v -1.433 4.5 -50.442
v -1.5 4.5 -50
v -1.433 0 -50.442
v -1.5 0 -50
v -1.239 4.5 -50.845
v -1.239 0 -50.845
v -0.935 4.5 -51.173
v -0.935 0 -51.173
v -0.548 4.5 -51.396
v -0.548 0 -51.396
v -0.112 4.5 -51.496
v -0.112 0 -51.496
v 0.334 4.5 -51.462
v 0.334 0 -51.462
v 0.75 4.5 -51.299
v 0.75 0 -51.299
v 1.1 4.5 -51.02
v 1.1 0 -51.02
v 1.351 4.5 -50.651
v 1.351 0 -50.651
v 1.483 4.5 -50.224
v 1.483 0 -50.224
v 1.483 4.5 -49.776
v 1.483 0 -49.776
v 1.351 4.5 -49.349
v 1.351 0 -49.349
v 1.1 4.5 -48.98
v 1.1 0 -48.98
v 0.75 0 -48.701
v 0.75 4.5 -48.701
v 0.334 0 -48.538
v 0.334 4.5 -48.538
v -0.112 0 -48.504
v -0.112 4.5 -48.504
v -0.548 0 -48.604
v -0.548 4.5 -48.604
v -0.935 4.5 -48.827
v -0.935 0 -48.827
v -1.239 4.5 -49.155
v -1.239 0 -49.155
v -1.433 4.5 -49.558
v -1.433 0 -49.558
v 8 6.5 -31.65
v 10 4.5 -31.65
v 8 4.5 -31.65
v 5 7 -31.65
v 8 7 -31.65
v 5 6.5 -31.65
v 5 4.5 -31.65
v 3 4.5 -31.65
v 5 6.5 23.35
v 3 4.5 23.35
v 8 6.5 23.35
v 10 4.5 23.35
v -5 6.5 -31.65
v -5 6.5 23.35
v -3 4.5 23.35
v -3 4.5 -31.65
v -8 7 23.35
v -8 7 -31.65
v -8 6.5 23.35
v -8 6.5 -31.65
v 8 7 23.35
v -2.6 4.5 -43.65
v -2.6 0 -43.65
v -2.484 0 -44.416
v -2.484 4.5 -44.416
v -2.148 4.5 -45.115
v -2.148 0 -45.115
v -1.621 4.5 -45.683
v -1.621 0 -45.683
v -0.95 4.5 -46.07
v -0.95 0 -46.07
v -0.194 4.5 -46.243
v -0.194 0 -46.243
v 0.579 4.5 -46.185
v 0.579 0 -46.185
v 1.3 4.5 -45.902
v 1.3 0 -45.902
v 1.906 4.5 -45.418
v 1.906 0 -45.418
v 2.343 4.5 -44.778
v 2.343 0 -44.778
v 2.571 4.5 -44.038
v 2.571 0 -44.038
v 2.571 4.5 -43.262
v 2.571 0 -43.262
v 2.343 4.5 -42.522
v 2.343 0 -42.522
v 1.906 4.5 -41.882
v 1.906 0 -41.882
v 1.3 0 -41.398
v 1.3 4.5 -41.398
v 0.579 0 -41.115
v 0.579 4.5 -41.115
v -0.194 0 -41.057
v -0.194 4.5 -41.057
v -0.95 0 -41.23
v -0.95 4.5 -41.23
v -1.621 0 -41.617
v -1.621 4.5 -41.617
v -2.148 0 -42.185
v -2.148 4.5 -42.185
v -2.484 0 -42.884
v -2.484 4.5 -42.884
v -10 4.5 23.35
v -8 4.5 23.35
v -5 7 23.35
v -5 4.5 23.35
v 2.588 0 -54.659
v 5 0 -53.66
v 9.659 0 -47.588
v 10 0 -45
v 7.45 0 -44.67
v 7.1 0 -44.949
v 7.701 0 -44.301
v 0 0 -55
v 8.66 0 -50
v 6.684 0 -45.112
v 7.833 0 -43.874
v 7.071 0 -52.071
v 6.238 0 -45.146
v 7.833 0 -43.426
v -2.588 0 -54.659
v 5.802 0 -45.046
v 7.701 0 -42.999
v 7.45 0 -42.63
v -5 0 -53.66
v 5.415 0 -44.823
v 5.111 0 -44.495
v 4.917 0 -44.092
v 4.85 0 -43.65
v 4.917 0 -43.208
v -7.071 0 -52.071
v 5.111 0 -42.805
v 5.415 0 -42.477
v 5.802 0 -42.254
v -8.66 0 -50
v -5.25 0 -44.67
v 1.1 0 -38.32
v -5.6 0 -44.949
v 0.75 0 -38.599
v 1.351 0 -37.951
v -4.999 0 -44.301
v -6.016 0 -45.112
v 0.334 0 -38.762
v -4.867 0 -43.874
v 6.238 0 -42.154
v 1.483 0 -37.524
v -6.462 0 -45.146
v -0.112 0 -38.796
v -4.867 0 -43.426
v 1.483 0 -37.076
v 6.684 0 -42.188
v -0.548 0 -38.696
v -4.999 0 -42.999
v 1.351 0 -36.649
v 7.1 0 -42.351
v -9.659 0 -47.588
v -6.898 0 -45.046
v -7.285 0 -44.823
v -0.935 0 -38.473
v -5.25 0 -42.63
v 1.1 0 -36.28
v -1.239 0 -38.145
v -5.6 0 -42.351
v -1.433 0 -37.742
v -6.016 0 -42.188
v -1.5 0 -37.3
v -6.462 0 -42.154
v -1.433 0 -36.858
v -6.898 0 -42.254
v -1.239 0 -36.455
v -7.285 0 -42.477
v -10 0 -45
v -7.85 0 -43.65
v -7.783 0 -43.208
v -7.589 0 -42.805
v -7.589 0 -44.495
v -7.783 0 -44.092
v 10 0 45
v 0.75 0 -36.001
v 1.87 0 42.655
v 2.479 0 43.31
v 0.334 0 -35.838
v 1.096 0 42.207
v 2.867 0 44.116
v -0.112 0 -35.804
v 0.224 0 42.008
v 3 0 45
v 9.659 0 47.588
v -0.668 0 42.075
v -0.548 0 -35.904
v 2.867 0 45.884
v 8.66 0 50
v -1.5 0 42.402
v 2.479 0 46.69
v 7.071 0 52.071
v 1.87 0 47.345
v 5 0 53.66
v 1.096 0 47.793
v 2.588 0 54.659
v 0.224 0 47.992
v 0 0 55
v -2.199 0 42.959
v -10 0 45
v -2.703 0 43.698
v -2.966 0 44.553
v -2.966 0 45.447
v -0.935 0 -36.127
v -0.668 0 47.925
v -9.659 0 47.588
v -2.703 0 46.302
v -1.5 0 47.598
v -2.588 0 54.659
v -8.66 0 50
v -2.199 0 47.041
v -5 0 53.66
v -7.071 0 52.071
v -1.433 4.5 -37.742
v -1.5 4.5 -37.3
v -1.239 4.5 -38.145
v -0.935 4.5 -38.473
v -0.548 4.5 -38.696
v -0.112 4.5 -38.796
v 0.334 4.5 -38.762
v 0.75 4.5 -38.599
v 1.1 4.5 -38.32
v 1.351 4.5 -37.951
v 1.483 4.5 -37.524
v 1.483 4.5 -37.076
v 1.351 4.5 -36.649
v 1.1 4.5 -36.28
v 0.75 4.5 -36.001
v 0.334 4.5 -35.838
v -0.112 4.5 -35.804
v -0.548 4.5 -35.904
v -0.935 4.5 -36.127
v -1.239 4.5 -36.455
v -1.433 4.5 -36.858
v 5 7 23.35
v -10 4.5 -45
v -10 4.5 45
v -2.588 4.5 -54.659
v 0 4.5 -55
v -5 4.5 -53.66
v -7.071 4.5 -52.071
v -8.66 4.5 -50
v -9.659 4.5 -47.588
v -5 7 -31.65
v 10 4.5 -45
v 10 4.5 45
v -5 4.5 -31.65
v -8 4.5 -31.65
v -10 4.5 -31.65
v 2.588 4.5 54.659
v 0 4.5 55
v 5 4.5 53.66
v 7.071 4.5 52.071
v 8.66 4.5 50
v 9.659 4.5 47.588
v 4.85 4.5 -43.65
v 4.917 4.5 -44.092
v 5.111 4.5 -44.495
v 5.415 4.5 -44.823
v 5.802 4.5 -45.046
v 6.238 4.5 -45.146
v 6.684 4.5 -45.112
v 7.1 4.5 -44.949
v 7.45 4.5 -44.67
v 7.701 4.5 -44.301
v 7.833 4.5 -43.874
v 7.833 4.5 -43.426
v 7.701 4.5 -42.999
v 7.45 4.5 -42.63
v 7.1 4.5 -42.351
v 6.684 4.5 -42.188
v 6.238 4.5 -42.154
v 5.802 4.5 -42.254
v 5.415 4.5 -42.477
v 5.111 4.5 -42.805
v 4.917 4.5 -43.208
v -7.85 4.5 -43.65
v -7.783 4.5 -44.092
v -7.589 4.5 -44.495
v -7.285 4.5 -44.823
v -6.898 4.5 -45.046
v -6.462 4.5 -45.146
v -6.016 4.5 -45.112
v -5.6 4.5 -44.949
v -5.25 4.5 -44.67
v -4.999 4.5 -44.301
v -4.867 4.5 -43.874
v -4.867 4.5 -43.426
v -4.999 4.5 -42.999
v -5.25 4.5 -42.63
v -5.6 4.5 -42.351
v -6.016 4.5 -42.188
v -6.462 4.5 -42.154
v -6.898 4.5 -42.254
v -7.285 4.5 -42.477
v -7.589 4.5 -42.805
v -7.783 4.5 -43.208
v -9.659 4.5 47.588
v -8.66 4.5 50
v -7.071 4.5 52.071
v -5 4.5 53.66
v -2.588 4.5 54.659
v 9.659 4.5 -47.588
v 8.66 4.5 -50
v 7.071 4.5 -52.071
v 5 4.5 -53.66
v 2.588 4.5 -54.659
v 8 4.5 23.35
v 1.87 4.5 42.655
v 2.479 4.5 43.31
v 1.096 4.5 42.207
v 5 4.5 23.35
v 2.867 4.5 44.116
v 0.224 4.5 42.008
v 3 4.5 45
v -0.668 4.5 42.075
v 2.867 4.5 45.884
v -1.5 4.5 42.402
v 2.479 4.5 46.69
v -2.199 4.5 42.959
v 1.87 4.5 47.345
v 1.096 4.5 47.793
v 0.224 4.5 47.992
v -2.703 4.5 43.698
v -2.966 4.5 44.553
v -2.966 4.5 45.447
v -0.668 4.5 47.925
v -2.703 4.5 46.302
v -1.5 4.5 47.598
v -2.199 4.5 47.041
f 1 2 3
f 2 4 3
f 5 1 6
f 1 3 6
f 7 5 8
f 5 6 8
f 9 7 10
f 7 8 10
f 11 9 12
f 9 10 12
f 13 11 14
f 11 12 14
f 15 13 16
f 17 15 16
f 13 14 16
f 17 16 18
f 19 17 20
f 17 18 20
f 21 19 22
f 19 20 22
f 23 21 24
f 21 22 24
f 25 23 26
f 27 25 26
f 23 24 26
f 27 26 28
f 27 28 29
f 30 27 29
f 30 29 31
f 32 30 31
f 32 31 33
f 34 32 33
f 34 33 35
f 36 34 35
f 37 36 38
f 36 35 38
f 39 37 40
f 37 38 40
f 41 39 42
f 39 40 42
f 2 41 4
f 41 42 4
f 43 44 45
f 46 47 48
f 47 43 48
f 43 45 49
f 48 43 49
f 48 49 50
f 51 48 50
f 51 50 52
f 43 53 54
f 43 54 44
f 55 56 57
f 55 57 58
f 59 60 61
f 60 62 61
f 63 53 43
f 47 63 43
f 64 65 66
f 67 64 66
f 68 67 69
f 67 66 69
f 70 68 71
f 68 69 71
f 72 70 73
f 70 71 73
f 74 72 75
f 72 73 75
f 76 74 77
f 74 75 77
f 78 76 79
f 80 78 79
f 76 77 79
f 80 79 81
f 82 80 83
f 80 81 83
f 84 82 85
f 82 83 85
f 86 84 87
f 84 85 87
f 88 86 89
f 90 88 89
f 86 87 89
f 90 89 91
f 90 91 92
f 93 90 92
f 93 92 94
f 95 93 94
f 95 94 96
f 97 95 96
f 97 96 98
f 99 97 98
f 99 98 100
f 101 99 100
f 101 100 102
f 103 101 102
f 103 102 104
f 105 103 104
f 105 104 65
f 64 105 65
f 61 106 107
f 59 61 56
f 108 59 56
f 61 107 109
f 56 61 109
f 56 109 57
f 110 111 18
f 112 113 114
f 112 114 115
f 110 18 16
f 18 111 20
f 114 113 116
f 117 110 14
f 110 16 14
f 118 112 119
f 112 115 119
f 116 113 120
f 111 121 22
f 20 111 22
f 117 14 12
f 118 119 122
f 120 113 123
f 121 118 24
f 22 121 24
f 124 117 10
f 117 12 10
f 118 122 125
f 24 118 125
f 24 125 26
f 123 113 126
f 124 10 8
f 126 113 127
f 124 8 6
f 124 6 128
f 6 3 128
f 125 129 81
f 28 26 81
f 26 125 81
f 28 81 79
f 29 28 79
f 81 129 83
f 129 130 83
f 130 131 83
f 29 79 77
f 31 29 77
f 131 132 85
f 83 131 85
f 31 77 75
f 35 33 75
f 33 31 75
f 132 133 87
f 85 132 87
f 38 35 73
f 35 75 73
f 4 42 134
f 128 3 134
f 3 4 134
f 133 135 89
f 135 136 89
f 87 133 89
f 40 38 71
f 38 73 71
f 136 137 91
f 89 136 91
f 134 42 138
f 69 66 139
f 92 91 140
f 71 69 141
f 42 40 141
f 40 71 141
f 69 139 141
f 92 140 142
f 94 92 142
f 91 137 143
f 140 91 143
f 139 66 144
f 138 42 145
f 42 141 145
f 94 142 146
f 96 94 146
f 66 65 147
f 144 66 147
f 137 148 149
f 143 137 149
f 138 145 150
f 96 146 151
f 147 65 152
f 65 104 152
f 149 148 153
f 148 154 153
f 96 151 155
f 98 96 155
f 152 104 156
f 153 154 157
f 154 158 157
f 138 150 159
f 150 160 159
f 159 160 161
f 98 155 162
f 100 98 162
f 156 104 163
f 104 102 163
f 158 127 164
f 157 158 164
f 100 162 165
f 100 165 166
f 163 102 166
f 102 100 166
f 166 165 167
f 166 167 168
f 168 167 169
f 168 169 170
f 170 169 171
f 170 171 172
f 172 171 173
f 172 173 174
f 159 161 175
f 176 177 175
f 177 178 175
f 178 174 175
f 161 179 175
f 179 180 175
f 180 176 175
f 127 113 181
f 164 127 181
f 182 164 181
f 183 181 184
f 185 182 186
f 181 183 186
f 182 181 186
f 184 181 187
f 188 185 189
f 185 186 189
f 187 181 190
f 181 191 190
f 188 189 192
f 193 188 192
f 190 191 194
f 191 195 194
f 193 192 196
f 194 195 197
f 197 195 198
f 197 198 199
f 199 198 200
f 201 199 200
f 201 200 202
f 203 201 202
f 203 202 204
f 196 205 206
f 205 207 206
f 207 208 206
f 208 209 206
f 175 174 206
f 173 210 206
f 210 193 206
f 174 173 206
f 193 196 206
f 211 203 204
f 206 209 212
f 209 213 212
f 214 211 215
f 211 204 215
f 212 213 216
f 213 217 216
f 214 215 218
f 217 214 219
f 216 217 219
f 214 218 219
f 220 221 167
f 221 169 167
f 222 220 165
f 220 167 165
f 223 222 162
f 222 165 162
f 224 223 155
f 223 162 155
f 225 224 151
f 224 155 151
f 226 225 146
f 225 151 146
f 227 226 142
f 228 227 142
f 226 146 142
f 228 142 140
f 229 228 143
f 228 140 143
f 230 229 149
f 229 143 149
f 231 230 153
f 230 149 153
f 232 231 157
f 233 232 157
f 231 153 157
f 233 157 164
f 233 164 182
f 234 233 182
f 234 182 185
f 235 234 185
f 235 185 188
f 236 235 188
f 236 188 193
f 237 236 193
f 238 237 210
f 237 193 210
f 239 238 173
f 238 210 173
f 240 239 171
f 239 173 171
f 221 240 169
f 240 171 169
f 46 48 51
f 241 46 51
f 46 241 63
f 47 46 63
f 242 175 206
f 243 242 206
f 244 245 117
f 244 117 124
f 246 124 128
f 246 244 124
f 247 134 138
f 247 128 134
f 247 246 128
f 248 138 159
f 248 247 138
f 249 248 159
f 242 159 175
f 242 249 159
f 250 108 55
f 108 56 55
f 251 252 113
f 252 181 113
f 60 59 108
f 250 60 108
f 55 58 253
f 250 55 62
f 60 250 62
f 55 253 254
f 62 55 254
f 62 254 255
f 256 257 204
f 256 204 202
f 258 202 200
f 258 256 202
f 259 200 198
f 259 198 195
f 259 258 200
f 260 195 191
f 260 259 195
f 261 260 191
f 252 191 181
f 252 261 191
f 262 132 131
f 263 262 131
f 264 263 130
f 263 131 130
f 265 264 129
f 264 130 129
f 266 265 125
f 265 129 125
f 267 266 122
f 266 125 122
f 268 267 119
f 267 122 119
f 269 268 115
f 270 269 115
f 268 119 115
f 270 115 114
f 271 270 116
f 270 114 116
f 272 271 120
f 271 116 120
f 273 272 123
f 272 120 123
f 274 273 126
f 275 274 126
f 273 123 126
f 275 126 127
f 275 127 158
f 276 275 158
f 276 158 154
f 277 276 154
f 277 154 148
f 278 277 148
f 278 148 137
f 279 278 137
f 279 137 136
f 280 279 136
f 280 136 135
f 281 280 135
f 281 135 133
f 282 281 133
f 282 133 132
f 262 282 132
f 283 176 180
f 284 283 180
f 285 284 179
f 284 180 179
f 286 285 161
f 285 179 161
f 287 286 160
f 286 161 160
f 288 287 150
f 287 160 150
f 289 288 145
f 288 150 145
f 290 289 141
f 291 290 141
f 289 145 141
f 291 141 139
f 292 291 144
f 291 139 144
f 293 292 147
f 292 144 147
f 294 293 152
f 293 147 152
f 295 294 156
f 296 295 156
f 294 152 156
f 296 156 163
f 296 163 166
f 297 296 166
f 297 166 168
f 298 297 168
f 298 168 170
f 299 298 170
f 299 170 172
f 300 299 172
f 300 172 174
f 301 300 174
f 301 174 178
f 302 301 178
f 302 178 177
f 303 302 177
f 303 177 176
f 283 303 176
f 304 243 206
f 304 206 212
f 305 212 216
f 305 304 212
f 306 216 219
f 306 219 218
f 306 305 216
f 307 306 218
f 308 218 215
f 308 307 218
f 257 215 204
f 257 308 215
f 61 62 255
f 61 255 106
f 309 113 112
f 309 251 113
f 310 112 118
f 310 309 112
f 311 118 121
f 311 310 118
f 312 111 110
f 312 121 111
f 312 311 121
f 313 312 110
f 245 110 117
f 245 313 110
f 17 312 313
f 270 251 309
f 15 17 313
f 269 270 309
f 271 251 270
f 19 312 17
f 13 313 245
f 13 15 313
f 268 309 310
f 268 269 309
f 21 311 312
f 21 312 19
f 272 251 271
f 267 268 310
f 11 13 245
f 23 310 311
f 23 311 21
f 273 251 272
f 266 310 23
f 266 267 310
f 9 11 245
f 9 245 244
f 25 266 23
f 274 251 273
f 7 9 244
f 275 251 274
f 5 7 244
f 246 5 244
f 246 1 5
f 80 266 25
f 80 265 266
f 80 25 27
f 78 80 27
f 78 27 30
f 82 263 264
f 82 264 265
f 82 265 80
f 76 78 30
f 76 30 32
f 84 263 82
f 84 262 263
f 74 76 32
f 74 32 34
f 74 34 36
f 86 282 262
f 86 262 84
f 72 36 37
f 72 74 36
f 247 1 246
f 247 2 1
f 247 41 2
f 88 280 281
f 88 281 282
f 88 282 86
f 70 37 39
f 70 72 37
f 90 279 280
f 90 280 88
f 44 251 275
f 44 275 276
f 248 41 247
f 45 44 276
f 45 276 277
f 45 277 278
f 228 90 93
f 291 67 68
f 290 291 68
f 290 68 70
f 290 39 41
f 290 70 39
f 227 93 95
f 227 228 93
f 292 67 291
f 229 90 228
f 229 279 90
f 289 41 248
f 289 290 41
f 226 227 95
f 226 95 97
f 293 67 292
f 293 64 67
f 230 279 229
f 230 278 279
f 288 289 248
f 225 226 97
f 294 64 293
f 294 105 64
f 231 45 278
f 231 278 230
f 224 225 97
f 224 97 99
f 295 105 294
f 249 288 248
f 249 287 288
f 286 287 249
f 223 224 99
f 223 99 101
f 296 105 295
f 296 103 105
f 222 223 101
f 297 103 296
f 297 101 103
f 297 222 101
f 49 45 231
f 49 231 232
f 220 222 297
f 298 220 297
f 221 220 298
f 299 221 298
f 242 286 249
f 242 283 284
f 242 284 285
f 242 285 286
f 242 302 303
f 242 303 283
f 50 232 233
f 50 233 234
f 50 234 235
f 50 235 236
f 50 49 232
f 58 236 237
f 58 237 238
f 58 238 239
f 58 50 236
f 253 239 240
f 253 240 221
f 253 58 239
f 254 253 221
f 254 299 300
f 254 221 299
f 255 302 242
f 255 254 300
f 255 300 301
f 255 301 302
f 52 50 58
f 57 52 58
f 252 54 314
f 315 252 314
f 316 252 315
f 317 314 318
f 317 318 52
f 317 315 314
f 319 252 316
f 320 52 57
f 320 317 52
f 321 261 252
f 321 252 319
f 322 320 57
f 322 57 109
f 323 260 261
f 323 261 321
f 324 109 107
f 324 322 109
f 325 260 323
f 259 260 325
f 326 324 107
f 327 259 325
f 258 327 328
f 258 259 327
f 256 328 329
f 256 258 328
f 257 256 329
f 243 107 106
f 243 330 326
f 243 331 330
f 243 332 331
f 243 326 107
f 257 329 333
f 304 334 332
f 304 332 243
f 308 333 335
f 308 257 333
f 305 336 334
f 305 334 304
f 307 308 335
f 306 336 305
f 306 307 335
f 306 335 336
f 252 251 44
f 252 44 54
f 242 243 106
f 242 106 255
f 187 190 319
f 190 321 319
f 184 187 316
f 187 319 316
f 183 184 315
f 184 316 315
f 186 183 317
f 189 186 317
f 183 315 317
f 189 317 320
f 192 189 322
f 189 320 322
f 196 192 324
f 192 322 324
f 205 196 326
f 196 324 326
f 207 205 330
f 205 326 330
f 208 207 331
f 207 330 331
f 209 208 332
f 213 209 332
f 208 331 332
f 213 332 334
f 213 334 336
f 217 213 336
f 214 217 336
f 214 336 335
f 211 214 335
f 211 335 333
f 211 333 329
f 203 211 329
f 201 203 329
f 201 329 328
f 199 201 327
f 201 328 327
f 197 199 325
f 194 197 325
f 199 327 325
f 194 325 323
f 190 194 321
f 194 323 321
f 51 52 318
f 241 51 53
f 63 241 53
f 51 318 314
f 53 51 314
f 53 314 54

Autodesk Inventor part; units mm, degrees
ref_plane "YZ Plane" through (0, 0, 0) normal (1, 0, 0) x (0, 1, 0)
ref_plane "XZ Plane" through (0, 0, 0) normal (0, 1, 0) x (-1, 0, 0)
ref_plane "XY Plane" through (0, 0, 0) normal (0, 0, 1) x (1, 0, 0)
sketch "Szkic1" plane through (0, 0, 0) normal (0, 1, 0) x (-1, 0, 0)
  line L0 (10, 55) -> (-10, 55)
  line L1 (-10, 55) -> (-10, -55)
  line L2 (-10, -55) -> (10, -55)
  line L3 (10, -55) -> (10, 55)
  line L4 (10, 55) -> (-10, -55) construction
  line L5 (-10, 55) -> (10, -55) construction
  circle A0 centre (0, -43.65) radius 2.6
  circle A1 centre (0, -37.3) radius 1.5
  circle A2 centre (0, -50) radius 1.5
  circle A3 centre (-6.35, -43.65) radius 1.5
  circle A4 centre (6.35, -43.65) radius 1.5
  line L6 (6.35, -43.65) -> (-6.35, -43.65)
  line L7 (0, -37.3) -> (0, -50)
  point P0 (0, 0)
  dimension "d0" = 20
  dimension "d1" = 110
  dimension "d2" = 5.2
  dimension "d3" = 3
  dimension "d4" = 3
  dimension "d5" = 6.35
  dimension "d6" = 6.35
  dimension "d7" = 5
  dimension "d22" = 3
  dimension "d23" = 3
  dimension "d24" = 6.35
  dimension "d25" = 6.35
  dimension "d26" = 8.9803
  dimension "d27" = 8.9803
  dimension "d28" = 3.65
extrude "Wyciągnięcie proste1" add sketch "Szkic1" along normal blind 4.5 contours L3 L2 L1 L0 | A3 | A4
sketch "Szkic3" plane through (0, 4.5, 0) normal (0, 1, 0) x (1, 0, 0)
  circle A0 centre (0, -45) radius 2.5 projected
  circle A1 centre (0, -45) radius 2.5
  point P0 (0, 0)
fillet "Zaokrąglenie1" radius 10 4 edges at (10, 2.25, -55) (-10, 2.25, -55) (10, 2.25, 55) (-10, 2.25, 55)
extrude "Wyciągnięcie proste4" cut sketch "Szkic3" against normal blind 10
sketch "Szkic4" plane through (0, 4.5, 0) normal (0, 1, 0) x (1, 0, 0)
  circle A0 centre (0, -45) radius 2.5 projected
  circle A1 centre (0, -45) radius 3
  point P0 (0, 0)
  dimension "d19" = 6
extrude "Wyciągnięcie proste5" cut sketch "Szkic4" against normal blind 10
extrude "Wyciągnięcie proste6" cut sketch "Szkic1" along normal blind 7 contours A3 | A4
sketch "Szkic5" plane through (0, 4.5, 0) normal (0, 1, 0) x (1, 0, 0)
  line L0 (-8, -23.35) -> (-5, -23.35)
  line L1 (-5, -23.35) -> (-5, 31.65)
  line L2 (-5, 31.65) -> (-8, 31.65)
  line L3 (-8, 31.65) -> (-8, -23.35)
  line L4 (5, -23.35) -> (8, -23.35)
  line L5 (8, -23.35) -> (8, 31.65)
  line L6 (8, 31.65) -> (5, 31.65)
  line L7 (5, 31.65) -> (5, -23.35)
  circle A0 centre (0, 43.65) radius 2.6 projected
  line L8 (10, -45) -> (10, 45) projected
  line L9 (-10, 45) -> (-10, -45) projected
  point P0 (0, 0)
  point P1 (6.5, 31.65)
  point P2 (6.5, -23.35)
  point P3 (-6.5, 31.65)
  point P4 (-6.5, -23.35)
  dimension "d31" = 55
  dimension "d32" = 55
  dimension "d33" = 67
  dimension "d34" = 3
  dimension "d35" = 3
  dimension "d36" = 2
  dimension "d37" = 2
extrude "Wyciągnięcie proste7" add sketch "Szkic5" along normal blind 2.5 contours L3 L2 L1 L0 | L7 L6 L5 L4
chamfer "Faza1" distance 2 angle 45 4 edges at (8, 4.5, -4.15) (-5, 4.5, -4.15) (-8, 4.5, -4.15) (5, 4.5, -4.15)
properties part number "link1_print_Drukowanie 3D"
